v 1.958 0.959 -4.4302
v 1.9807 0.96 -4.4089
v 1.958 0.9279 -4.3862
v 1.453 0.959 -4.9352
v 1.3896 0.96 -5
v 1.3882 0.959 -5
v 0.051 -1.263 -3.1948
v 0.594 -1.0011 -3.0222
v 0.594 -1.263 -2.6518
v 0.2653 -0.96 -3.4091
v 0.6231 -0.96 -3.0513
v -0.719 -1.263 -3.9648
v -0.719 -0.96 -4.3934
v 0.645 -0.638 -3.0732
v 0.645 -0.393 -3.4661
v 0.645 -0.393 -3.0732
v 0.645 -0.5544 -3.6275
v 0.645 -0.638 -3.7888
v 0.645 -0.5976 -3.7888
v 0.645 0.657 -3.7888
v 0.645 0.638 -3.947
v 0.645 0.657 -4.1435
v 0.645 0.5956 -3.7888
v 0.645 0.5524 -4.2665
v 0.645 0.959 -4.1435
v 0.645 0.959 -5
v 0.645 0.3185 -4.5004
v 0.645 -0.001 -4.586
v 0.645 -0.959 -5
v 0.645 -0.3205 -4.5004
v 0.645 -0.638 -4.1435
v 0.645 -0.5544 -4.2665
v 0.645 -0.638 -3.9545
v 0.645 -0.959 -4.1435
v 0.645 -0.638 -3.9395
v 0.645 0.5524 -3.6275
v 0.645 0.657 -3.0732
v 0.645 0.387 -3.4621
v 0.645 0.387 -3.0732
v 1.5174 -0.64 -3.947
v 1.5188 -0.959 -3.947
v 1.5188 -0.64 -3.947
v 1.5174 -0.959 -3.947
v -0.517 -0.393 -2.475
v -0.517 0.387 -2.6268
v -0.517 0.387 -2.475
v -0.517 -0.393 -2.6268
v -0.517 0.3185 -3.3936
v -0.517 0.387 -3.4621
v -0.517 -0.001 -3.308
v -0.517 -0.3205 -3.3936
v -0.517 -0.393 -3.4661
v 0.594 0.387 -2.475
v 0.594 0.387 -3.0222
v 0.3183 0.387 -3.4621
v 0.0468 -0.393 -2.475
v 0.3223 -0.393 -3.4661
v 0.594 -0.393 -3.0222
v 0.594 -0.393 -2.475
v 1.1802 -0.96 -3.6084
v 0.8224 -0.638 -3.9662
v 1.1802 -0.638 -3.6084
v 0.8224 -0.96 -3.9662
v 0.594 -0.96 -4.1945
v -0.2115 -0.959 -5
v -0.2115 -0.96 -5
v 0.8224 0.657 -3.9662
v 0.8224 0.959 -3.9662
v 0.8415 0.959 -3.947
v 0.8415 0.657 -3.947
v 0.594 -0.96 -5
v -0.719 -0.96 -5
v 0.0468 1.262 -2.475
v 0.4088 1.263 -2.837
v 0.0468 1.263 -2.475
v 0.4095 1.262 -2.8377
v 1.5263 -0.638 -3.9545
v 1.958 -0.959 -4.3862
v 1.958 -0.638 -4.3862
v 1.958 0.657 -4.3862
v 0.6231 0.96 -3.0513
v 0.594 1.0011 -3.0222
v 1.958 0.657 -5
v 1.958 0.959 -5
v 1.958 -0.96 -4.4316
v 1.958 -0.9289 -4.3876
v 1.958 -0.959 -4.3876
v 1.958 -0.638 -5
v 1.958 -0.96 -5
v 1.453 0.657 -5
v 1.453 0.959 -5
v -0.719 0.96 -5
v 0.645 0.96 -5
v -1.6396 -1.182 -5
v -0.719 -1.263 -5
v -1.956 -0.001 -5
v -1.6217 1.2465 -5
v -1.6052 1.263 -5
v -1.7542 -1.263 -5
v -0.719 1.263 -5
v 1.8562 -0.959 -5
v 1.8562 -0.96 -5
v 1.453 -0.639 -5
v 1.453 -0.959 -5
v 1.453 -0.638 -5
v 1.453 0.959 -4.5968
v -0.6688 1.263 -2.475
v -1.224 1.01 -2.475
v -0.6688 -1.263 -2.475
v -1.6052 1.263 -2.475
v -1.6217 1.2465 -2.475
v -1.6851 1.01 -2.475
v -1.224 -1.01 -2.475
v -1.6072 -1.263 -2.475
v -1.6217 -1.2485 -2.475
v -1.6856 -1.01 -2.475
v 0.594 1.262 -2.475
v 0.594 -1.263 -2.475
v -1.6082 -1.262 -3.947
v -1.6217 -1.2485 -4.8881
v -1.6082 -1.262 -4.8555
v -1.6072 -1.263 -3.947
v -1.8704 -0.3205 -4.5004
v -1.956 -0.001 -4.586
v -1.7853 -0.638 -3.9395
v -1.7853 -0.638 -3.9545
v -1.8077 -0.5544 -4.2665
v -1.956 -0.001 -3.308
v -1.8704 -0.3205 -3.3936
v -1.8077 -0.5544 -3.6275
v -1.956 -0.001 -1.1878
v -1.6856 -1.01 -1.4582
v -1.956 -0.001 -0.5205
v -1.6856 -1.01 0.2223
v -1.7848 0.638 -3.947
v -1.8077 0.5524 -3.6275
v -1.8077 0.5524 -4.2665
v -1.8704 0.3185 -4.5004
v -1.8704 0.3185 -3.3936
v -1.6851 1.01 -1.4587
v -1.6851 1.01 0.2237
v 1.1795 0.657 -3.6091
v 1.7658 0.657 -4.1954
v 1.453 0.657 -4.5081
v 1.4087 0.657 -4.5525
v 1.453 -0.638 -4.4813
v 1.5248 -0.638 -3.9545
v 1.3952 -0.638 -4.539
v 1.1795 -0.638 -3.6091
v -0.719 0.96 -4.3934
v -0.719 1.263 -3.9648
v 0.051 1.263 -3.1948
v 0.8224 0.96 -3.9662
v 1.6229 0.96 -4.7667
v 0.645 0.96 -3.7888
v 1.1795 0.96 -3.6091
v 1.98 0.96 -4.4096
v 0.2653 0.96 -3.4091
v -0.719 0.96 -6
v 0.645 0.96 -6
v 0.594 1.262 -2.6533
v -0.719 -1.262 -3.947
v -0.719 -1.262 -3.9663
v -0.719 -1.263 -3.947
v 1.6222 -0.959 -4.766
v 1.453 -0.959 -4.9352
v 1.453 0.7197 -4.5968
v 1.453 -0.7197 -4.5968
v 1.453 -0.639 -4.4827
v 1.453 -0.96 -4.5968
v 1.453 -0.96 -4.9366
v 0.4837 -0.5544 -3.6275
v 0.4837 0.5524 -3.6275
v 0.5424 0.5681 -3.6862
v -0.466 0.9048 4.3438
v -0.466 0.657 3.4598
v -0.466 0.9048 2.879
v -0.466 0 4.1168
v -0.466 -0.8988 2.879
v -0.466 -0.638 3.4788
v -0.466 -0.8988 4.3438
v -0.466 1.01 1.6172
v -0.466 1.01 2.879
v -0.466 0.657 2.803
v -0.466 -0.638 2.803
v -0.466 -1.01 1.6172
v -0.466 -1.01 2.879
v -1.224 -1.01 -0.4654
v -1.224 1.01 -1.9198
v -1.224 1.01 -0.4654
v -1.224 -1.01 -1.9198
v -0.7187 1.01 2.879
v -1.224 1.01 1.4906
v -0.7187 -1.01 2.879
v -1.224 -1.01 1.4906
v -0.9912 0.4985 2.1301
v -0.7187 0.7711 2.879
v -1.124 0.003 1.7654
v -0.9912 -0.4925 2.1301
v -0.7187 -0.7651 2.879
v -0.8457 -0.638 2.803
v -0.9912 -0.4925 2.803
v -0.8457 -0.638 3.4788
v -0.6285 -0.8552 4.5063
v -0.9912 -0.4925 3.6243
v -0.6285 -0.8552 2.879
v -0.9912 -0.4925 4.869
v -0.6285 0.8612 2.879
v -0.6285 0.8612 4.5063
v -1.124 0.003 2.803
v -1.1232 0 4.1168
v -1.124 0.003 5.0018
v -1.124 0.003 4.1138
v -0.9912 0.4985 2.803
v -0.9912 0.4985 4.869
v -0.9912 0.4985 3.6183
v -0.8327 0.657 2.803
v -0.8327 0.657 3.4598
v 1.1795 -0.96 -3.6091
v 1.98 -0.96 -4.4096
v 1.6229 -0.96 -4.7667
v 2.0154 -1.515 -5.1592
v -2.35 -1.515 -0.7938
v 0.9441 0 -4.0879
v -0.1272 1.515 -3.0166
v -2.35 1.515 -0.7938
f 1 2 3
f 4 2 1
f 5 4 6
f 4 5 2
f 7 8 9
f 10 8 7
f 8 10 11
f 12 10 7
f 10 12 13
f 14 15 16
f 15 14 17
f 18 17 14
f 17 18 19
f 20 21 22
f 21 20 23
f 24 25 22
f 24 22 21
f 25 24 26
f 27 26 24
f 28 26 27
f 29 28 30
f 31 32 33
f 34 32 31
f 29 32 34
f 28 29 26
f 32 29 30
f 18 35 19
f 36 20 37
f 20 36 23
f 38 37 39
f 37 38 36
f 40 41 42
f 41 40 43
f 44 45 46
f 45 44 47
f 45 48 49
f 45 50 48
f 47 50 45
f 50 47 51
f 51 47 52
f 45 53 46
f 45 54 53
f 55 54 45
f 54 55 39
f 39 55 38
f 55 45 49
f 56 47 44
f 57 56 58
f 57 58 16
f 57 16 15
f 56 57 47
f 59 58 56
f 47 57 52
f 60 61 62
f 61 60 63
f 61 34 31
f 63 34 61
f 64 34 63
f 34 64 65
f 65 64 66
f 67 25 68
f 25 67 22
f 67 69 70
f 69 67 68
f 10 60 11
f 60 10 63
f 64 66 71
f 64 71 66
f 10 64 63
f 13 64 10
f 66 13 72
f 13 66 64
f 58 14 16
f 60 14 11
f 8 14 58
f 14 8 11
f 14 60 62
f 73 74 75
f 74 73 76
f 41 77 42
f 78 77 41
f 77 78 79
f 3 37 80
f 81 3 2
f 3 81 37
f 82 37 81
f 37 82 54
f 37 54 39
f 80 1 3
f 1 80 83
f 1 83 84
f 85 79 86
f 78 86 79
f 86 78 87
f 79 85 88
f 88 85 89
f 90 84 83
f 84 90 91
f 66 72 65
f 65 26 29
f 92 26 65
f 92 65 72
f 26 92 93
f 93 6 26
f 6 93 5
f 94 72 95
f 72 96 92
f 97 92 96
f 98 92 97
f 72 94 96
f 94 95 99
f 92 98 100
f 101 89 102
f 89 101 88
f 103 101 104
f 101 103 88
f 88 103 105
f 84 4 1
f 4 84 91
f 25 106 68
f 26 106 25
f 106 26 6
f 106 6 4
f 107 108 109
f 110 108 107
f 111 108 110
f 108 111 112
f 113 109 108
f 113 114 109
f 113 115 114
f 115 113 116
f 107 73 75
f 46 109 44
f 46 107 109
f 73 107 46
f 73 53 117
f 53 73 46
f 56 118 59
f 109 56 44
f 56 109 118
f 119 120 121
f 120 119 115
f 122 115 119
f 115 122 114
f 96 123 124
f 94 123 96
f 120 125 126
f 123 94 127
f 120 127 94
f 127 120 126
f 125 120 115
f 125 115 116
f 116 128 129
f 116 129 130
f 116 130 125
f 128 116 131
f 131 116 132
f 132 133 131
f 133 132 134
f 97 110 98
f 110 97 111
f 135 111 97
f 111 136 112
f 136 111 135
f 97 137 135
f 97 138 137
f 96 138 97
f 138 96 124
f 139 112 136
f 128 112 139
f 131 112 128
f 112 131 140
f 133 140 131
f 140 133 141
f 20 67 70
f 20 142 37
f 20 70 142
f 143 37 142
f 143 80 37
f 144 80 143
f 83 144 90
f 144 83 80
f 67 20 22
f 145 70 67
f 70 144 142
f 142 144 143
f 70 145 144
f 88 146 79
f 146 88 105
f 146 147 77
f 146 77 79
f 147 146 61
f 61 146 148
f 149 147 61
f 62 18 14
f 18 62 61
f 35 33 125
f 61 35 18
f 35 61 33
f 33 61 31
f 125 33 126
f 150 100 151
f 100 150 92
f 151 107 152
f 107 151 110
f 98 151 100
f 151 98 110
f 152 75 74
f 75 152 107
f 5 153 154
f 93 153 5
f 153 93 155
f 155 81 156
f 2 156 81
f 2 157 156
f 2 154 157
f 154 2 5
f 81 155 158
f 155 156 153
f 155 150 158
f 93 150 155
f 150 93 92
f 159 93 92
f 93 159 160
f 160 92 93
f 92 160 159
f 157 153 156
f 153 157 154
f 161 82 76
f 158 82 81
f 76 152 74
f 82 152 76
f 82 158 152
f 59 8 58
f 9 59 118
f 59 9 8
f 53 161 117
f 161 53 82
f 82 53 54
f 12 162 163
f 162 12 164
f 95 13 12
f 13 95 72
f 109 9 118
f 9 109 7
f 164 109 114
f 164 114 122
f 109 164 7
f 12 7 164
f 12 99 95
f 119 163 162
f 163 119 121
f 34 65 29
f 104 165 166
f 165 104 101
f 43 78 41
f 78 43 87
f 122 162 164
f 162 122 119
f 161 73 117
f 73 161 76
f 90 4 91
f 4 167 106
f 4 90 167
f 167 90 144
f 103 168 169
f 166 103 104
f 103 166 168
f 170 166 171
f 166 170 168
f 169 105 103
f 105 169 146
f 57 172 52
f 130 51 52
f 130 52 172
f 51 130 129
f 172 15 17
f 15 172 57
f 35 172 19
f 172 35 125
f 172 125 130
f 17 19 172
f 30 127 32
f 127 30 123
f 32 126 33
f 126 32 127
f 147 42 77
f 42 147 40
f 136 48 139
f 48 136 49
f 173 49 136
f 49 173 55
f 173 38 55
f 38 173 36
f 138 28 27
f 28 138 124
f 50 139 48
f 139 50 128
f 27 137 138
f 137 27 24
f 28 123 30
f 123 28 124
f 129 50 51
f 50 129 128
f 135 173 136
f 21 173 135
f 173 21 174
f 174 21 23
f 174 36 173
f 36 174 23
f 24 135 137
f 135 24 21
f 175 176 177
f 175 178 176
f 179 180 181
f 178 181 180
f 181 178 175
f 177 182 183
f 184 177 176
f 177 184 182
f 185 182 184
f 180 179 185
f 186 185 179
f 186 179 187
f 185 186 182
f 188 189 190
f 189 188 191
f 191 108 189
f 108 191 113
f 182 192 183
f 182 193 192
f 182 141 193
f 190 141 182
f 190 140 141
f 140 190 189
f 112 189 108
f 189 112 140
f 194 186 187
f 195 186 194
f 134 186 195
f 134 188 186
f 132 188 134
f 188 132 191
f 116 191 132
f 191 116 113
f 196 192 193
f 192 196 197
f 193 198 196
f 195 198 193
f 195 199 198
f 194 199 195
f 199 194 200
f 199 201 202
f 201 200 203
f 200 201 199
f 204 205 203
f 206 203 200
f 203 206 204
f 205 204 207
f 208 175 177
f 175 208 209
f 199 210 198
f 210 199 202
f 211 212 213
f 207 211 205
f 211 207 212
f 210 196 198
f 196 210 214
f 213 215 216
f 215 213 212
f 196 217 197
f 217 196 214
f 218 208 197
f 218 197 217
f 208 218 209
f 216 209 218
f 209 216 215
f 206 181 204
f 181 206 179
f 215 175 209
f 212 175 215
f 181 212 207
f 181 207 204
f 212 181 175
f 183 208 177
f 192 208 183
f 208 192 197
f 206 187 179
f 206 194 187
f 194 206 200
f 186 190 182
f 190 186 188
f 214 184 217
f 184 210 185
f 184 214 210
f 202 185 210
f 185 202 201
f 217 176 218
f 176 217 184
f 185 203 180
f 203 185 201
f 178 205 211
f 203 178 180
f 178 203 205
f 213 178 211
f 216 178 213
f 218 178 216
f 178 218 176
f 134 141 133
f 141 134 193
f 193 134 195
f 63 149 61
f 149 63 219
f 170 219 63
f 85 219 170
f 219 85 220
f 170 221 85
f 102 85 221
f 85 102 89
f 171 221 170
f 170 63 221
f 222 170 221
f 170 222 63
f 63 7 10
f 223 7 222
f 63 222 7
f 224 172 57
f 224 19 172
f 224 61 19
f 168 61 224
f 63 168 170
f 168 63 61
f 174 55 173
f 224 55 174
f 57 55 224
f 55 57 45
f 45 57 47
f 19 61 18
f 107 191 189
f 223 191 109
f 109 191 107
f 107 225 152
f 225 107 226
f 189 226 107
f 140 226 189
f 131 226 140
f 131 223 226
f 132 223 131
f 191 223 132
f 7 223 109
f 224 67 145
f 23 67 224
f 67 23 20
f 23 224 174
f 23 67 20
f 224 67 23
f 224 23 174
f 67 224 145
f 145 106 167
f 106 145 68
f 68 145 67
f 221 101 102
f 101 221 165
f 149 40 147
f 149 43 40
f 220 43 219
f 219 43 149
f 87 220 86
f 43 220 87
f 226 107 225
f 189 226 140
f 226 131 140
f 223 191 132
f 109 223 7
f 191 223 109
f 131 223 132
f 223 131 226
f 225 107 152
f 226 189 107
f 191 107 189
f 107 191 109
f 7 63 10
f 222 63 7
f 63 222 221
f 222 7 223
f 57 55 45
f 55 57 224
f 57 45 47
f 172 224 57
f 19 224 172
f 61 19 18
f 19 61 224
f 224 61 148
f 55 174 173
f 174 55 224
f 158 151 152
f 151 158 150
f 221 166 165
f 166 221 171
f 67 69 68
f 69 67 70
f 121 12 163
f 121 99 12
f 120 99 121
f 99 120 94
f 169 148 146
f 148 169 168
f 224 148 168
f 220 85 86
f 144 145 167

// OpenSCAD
intersection() {
translate([-2.35, -1.515, -6]) cube(size = [4.699, 3.03, 12], center = false);
union() {
intersection() {
union() {
difference() {
rotate([-135, -45, 0])
translate([-18.1, -18.1, -18.1]) cube(size = [36.2, 20.616, 36.2], center = false);
translate([-0.517, -0.393, -3.947]) cube(size = [1.162, 0.78, 22.047], center = false);
}
rotate([90, 45, 0])
translate([-18.1, -18.1, 0.393]) cube(size = [21.486, 16.383, 0.567], center = false);
translate([-18.1, -0.96, -5]) cube(size = [20.058, 1.919, 1.053], center = false);
}
difference() {
difference() {
rotate([0, 0, 0])
translate([0.539, -0.001, -5])
cylinder(h = 2.525, r1 = 2.495, r2 = 2.495, center = false, $fn = 12);
translate([0.645, -0.638, -5]) cube(size = [17.455, 1.295, 23.1], center = false);
}
difference() {
translate([-0.719, 0.96, -18.1]) cube(size = [18.819, 0.303, 15.625], center = false);
rotate([-135, -45, 0])
translate([-2.223, -18.1, -18.1]) cube(size = [20.323, 36.2, 20.616], center = false);
}
}
union() {
difference() {
union() {
translate([-0.719, -1.263, -5]) cube(size = [1.313, 0.303, 2.525], center = false);
rotate([90, 45, 0])
translate([-18.1, -18.1, -0.96]) cube(size = [21.486, 16.383, 2.222], center = false);
}
rotate([90, 45, 0])
translate([-18.1, -18.1, -0.657]) cube(size = [21.486, 16.383, 1.295], center = false);
}
difference() {
union() {
rotate([90, 45, 0])
translate([-18.1, -18.1, -1.263]) cube(size = [36.2, 16.383, 2.222], center = false);
translate([-18.1, -1.263, -3.947]) cube(size = [18.694, 2.525, 1.472], center = false);
}
union() {
translate([0.645, -1.263, -5]) cube(size = [0.808, 2.222, 1.053], center = false);
rotate([180, 90, -180])
translate([3.947, -0.001, -18.1])
cylinder(h = 20.058, r1 = 0.639, r2 = 0.639, center = false, $fn = 12);
}
}
}
}
difference() {
intersection() {
union() {
difference() {
translate([-1.224, -1.01, -18.1]) cube(size = [0.758, 2.02, 36.2], center = false);
rotate([90, 20, 0])
translate([-18.1, -18.1, -1.01]) cube(size = [16.44, 36.2, 2.02], center = false);
}
intersection() {
rotate([180, 0, 180])
translate([0.133, 0.003, -18.1])
cylinder(h = 20.575, r1 = 0.991, r2 = 0.991, center = false, $fn = 12);
rotate([135, 0, 0])
translate([-1.224, -18.1, -18.1]) cube(size = [0.758, 36.2, 36.2], center = false);
}
}
rotate([90, 45, 0])
translate([-18.1, -18.1, -18.1]) cube(size = [36.2, 20.842, 19.11], center = false);
}
union() {
difference() {
rotate([90, 20, 0])
translate([-1.66, -18.1, -18.1]) cube(size = [19.76, 36.2, 19.11], center = false);
union() {
rotate([180, 0, 180])
translate([0.133, 0.003, -18.1])
cylinder(h = 20.575, r1 = 0.991, r2 = 0.991, center = false, $fn = 12);
translate([-18.1, -18.1, -18.1]) cube(size = [17.634, 36.2, 20.979], center = false);
}
}
intersection() {
union() {
rotate([90, 20, 0])
translate([-0.991, -18.1, -18.1]) cube(size = [19.091, 36.2, 19.11], center = false);
translate([-1.224, -0.638, 2.803]) cube(size = [19.324, 1.295, 15.297], center = false);
}
rotate([135, 0, 0])
translate([-18.1, -18.1, -2.911]) cube(size = [36.2, 21.011, 21.01], center = false);
}
}
}
difference() {
intersection() {
union() {
difference() {
translate([-18.1, -1.01, -18.1]) cube(size = [17.634, 2.02, 20.979], center = false);
rotate([180, 0, 180])
translate([0.133, 0.003, -2.803])
cylinder(h = 20.903, r1 = 0.991, r2 = 0.991, center = false, $fn = 12);
}
intersection() {
rotate([90, 20, 0])
translate([-18.1, -18.1, -18.1]) cube(size = [16.44, 36.2, 17.443], center = false);
rotate([135, 0, 0])
translate([-18.1, -18.1, -2.911]) cube(size = [16.876, 36.2, 21.01], center = false);
}
}
union() {
difference() {
rotate([90, 20, 0])
translate([-1.66, -18.1, -1.01]) cube(size = [19.76, 36.2, 2.02], center = false);
translate([-18.1, -18.1, -3.947]) cube(size = [17.634, 18.757, 1.472], center = false);
}
difference() {
rotate([0, 0, 0])
translate([0.539, -0.001, -3.947])
cylinder(h = 1.472, r1 = 2.495, r2 = 2.495, center = false, $fn = 12);
rotate([180, 90, -180])
translate([3.947, -0.001, -18.1])
cylinder(h = 36.2, r1 = 0.639, r2 = 0.639, center = false, $fn = 12);
}
}
}
union() {
difference() {
rotate([135, 0, 0])
translate([-18.1, -18.1, -2.911]) cube(size = [17.634, 21.011, 21.01], center = false);
rotate([0, 0, 0])
translate([0.539, -0.001, -3.947])
cylinder(h = 6.826, r1 = 2.495, r2 = 2.495, center = false, $fn = 12);
}
rotate([180, 0, 180])
translate([0.133, 0.003, 3.947])
cylinder(h = 14.153, r1 = 0.991, r2 = 0.991, center = false, $fn = 12);
translate([-1.224, -1.01, -2.475]) cube(size = [0.758, 2.02, 5.354], center = false);
}
}
intersection() {
union() {
rotate([-135, -45, 0])
translate([-18.1, -18.1, -18.1]) cube(size = [15.877, 36.2, 20.616], center = false);
rotate([90, 45, 0])
translate([-18.1, -18.1, -0.96]) cube(size = [36.2, 15.877, 1.919], center = false);
rotate([90, 45, 0])
translate([3.386, -2.223, -0.96]) cube(size = [14.714, 0.505, 0.303], center = false);
translate([-0.719, -18.1, -5]) cube(size = [1.364, 16.837, 1.053], center = false);
difference() {
rotate([90, 45, 0])
translate([3.386, -2.223, -0.387]) cube(size = [14.714, 0.505, 1.347], center = false);
translate([0.645, -0.638, -18.1]) cube(size = [17.455, 1.026, 15.625], center = false);
}
}
union() {
difference() {
translate([-18.1, -1.263, -5]) cube(size = [17.381, 0.303, 1.053], center = false);
rotate([-135, -45, 0])
translate([-18.1, -18.1, -18.1]) cube(size = [15.877, 20.616, 20.616], center = false);
}
translate([-0.719, 0.96, -18.1]) cube(size = [1.364, 0.303, 15.625], center = false);
rotate([-135, -45, 0])
translate([-2.223, -18.1, -18.1]) cube(size = [0.505, 20.616, 20.616], center = false);
rotate([-135, -45, 0])
translate([-2.223, 2.516, -18.1]) cube(size = [0.505, 15.584, 20.616], center = false);
translate([1.453, -0.96, -5]) cube(size = [0.505, 0.321, 1.053], center = false);
rotate([-135, -45, 0])
translate([-2.223, -18.1, 2.516]) cube(size = [20.323, 20.616, 15.584], center = false);
}
}
}
}
